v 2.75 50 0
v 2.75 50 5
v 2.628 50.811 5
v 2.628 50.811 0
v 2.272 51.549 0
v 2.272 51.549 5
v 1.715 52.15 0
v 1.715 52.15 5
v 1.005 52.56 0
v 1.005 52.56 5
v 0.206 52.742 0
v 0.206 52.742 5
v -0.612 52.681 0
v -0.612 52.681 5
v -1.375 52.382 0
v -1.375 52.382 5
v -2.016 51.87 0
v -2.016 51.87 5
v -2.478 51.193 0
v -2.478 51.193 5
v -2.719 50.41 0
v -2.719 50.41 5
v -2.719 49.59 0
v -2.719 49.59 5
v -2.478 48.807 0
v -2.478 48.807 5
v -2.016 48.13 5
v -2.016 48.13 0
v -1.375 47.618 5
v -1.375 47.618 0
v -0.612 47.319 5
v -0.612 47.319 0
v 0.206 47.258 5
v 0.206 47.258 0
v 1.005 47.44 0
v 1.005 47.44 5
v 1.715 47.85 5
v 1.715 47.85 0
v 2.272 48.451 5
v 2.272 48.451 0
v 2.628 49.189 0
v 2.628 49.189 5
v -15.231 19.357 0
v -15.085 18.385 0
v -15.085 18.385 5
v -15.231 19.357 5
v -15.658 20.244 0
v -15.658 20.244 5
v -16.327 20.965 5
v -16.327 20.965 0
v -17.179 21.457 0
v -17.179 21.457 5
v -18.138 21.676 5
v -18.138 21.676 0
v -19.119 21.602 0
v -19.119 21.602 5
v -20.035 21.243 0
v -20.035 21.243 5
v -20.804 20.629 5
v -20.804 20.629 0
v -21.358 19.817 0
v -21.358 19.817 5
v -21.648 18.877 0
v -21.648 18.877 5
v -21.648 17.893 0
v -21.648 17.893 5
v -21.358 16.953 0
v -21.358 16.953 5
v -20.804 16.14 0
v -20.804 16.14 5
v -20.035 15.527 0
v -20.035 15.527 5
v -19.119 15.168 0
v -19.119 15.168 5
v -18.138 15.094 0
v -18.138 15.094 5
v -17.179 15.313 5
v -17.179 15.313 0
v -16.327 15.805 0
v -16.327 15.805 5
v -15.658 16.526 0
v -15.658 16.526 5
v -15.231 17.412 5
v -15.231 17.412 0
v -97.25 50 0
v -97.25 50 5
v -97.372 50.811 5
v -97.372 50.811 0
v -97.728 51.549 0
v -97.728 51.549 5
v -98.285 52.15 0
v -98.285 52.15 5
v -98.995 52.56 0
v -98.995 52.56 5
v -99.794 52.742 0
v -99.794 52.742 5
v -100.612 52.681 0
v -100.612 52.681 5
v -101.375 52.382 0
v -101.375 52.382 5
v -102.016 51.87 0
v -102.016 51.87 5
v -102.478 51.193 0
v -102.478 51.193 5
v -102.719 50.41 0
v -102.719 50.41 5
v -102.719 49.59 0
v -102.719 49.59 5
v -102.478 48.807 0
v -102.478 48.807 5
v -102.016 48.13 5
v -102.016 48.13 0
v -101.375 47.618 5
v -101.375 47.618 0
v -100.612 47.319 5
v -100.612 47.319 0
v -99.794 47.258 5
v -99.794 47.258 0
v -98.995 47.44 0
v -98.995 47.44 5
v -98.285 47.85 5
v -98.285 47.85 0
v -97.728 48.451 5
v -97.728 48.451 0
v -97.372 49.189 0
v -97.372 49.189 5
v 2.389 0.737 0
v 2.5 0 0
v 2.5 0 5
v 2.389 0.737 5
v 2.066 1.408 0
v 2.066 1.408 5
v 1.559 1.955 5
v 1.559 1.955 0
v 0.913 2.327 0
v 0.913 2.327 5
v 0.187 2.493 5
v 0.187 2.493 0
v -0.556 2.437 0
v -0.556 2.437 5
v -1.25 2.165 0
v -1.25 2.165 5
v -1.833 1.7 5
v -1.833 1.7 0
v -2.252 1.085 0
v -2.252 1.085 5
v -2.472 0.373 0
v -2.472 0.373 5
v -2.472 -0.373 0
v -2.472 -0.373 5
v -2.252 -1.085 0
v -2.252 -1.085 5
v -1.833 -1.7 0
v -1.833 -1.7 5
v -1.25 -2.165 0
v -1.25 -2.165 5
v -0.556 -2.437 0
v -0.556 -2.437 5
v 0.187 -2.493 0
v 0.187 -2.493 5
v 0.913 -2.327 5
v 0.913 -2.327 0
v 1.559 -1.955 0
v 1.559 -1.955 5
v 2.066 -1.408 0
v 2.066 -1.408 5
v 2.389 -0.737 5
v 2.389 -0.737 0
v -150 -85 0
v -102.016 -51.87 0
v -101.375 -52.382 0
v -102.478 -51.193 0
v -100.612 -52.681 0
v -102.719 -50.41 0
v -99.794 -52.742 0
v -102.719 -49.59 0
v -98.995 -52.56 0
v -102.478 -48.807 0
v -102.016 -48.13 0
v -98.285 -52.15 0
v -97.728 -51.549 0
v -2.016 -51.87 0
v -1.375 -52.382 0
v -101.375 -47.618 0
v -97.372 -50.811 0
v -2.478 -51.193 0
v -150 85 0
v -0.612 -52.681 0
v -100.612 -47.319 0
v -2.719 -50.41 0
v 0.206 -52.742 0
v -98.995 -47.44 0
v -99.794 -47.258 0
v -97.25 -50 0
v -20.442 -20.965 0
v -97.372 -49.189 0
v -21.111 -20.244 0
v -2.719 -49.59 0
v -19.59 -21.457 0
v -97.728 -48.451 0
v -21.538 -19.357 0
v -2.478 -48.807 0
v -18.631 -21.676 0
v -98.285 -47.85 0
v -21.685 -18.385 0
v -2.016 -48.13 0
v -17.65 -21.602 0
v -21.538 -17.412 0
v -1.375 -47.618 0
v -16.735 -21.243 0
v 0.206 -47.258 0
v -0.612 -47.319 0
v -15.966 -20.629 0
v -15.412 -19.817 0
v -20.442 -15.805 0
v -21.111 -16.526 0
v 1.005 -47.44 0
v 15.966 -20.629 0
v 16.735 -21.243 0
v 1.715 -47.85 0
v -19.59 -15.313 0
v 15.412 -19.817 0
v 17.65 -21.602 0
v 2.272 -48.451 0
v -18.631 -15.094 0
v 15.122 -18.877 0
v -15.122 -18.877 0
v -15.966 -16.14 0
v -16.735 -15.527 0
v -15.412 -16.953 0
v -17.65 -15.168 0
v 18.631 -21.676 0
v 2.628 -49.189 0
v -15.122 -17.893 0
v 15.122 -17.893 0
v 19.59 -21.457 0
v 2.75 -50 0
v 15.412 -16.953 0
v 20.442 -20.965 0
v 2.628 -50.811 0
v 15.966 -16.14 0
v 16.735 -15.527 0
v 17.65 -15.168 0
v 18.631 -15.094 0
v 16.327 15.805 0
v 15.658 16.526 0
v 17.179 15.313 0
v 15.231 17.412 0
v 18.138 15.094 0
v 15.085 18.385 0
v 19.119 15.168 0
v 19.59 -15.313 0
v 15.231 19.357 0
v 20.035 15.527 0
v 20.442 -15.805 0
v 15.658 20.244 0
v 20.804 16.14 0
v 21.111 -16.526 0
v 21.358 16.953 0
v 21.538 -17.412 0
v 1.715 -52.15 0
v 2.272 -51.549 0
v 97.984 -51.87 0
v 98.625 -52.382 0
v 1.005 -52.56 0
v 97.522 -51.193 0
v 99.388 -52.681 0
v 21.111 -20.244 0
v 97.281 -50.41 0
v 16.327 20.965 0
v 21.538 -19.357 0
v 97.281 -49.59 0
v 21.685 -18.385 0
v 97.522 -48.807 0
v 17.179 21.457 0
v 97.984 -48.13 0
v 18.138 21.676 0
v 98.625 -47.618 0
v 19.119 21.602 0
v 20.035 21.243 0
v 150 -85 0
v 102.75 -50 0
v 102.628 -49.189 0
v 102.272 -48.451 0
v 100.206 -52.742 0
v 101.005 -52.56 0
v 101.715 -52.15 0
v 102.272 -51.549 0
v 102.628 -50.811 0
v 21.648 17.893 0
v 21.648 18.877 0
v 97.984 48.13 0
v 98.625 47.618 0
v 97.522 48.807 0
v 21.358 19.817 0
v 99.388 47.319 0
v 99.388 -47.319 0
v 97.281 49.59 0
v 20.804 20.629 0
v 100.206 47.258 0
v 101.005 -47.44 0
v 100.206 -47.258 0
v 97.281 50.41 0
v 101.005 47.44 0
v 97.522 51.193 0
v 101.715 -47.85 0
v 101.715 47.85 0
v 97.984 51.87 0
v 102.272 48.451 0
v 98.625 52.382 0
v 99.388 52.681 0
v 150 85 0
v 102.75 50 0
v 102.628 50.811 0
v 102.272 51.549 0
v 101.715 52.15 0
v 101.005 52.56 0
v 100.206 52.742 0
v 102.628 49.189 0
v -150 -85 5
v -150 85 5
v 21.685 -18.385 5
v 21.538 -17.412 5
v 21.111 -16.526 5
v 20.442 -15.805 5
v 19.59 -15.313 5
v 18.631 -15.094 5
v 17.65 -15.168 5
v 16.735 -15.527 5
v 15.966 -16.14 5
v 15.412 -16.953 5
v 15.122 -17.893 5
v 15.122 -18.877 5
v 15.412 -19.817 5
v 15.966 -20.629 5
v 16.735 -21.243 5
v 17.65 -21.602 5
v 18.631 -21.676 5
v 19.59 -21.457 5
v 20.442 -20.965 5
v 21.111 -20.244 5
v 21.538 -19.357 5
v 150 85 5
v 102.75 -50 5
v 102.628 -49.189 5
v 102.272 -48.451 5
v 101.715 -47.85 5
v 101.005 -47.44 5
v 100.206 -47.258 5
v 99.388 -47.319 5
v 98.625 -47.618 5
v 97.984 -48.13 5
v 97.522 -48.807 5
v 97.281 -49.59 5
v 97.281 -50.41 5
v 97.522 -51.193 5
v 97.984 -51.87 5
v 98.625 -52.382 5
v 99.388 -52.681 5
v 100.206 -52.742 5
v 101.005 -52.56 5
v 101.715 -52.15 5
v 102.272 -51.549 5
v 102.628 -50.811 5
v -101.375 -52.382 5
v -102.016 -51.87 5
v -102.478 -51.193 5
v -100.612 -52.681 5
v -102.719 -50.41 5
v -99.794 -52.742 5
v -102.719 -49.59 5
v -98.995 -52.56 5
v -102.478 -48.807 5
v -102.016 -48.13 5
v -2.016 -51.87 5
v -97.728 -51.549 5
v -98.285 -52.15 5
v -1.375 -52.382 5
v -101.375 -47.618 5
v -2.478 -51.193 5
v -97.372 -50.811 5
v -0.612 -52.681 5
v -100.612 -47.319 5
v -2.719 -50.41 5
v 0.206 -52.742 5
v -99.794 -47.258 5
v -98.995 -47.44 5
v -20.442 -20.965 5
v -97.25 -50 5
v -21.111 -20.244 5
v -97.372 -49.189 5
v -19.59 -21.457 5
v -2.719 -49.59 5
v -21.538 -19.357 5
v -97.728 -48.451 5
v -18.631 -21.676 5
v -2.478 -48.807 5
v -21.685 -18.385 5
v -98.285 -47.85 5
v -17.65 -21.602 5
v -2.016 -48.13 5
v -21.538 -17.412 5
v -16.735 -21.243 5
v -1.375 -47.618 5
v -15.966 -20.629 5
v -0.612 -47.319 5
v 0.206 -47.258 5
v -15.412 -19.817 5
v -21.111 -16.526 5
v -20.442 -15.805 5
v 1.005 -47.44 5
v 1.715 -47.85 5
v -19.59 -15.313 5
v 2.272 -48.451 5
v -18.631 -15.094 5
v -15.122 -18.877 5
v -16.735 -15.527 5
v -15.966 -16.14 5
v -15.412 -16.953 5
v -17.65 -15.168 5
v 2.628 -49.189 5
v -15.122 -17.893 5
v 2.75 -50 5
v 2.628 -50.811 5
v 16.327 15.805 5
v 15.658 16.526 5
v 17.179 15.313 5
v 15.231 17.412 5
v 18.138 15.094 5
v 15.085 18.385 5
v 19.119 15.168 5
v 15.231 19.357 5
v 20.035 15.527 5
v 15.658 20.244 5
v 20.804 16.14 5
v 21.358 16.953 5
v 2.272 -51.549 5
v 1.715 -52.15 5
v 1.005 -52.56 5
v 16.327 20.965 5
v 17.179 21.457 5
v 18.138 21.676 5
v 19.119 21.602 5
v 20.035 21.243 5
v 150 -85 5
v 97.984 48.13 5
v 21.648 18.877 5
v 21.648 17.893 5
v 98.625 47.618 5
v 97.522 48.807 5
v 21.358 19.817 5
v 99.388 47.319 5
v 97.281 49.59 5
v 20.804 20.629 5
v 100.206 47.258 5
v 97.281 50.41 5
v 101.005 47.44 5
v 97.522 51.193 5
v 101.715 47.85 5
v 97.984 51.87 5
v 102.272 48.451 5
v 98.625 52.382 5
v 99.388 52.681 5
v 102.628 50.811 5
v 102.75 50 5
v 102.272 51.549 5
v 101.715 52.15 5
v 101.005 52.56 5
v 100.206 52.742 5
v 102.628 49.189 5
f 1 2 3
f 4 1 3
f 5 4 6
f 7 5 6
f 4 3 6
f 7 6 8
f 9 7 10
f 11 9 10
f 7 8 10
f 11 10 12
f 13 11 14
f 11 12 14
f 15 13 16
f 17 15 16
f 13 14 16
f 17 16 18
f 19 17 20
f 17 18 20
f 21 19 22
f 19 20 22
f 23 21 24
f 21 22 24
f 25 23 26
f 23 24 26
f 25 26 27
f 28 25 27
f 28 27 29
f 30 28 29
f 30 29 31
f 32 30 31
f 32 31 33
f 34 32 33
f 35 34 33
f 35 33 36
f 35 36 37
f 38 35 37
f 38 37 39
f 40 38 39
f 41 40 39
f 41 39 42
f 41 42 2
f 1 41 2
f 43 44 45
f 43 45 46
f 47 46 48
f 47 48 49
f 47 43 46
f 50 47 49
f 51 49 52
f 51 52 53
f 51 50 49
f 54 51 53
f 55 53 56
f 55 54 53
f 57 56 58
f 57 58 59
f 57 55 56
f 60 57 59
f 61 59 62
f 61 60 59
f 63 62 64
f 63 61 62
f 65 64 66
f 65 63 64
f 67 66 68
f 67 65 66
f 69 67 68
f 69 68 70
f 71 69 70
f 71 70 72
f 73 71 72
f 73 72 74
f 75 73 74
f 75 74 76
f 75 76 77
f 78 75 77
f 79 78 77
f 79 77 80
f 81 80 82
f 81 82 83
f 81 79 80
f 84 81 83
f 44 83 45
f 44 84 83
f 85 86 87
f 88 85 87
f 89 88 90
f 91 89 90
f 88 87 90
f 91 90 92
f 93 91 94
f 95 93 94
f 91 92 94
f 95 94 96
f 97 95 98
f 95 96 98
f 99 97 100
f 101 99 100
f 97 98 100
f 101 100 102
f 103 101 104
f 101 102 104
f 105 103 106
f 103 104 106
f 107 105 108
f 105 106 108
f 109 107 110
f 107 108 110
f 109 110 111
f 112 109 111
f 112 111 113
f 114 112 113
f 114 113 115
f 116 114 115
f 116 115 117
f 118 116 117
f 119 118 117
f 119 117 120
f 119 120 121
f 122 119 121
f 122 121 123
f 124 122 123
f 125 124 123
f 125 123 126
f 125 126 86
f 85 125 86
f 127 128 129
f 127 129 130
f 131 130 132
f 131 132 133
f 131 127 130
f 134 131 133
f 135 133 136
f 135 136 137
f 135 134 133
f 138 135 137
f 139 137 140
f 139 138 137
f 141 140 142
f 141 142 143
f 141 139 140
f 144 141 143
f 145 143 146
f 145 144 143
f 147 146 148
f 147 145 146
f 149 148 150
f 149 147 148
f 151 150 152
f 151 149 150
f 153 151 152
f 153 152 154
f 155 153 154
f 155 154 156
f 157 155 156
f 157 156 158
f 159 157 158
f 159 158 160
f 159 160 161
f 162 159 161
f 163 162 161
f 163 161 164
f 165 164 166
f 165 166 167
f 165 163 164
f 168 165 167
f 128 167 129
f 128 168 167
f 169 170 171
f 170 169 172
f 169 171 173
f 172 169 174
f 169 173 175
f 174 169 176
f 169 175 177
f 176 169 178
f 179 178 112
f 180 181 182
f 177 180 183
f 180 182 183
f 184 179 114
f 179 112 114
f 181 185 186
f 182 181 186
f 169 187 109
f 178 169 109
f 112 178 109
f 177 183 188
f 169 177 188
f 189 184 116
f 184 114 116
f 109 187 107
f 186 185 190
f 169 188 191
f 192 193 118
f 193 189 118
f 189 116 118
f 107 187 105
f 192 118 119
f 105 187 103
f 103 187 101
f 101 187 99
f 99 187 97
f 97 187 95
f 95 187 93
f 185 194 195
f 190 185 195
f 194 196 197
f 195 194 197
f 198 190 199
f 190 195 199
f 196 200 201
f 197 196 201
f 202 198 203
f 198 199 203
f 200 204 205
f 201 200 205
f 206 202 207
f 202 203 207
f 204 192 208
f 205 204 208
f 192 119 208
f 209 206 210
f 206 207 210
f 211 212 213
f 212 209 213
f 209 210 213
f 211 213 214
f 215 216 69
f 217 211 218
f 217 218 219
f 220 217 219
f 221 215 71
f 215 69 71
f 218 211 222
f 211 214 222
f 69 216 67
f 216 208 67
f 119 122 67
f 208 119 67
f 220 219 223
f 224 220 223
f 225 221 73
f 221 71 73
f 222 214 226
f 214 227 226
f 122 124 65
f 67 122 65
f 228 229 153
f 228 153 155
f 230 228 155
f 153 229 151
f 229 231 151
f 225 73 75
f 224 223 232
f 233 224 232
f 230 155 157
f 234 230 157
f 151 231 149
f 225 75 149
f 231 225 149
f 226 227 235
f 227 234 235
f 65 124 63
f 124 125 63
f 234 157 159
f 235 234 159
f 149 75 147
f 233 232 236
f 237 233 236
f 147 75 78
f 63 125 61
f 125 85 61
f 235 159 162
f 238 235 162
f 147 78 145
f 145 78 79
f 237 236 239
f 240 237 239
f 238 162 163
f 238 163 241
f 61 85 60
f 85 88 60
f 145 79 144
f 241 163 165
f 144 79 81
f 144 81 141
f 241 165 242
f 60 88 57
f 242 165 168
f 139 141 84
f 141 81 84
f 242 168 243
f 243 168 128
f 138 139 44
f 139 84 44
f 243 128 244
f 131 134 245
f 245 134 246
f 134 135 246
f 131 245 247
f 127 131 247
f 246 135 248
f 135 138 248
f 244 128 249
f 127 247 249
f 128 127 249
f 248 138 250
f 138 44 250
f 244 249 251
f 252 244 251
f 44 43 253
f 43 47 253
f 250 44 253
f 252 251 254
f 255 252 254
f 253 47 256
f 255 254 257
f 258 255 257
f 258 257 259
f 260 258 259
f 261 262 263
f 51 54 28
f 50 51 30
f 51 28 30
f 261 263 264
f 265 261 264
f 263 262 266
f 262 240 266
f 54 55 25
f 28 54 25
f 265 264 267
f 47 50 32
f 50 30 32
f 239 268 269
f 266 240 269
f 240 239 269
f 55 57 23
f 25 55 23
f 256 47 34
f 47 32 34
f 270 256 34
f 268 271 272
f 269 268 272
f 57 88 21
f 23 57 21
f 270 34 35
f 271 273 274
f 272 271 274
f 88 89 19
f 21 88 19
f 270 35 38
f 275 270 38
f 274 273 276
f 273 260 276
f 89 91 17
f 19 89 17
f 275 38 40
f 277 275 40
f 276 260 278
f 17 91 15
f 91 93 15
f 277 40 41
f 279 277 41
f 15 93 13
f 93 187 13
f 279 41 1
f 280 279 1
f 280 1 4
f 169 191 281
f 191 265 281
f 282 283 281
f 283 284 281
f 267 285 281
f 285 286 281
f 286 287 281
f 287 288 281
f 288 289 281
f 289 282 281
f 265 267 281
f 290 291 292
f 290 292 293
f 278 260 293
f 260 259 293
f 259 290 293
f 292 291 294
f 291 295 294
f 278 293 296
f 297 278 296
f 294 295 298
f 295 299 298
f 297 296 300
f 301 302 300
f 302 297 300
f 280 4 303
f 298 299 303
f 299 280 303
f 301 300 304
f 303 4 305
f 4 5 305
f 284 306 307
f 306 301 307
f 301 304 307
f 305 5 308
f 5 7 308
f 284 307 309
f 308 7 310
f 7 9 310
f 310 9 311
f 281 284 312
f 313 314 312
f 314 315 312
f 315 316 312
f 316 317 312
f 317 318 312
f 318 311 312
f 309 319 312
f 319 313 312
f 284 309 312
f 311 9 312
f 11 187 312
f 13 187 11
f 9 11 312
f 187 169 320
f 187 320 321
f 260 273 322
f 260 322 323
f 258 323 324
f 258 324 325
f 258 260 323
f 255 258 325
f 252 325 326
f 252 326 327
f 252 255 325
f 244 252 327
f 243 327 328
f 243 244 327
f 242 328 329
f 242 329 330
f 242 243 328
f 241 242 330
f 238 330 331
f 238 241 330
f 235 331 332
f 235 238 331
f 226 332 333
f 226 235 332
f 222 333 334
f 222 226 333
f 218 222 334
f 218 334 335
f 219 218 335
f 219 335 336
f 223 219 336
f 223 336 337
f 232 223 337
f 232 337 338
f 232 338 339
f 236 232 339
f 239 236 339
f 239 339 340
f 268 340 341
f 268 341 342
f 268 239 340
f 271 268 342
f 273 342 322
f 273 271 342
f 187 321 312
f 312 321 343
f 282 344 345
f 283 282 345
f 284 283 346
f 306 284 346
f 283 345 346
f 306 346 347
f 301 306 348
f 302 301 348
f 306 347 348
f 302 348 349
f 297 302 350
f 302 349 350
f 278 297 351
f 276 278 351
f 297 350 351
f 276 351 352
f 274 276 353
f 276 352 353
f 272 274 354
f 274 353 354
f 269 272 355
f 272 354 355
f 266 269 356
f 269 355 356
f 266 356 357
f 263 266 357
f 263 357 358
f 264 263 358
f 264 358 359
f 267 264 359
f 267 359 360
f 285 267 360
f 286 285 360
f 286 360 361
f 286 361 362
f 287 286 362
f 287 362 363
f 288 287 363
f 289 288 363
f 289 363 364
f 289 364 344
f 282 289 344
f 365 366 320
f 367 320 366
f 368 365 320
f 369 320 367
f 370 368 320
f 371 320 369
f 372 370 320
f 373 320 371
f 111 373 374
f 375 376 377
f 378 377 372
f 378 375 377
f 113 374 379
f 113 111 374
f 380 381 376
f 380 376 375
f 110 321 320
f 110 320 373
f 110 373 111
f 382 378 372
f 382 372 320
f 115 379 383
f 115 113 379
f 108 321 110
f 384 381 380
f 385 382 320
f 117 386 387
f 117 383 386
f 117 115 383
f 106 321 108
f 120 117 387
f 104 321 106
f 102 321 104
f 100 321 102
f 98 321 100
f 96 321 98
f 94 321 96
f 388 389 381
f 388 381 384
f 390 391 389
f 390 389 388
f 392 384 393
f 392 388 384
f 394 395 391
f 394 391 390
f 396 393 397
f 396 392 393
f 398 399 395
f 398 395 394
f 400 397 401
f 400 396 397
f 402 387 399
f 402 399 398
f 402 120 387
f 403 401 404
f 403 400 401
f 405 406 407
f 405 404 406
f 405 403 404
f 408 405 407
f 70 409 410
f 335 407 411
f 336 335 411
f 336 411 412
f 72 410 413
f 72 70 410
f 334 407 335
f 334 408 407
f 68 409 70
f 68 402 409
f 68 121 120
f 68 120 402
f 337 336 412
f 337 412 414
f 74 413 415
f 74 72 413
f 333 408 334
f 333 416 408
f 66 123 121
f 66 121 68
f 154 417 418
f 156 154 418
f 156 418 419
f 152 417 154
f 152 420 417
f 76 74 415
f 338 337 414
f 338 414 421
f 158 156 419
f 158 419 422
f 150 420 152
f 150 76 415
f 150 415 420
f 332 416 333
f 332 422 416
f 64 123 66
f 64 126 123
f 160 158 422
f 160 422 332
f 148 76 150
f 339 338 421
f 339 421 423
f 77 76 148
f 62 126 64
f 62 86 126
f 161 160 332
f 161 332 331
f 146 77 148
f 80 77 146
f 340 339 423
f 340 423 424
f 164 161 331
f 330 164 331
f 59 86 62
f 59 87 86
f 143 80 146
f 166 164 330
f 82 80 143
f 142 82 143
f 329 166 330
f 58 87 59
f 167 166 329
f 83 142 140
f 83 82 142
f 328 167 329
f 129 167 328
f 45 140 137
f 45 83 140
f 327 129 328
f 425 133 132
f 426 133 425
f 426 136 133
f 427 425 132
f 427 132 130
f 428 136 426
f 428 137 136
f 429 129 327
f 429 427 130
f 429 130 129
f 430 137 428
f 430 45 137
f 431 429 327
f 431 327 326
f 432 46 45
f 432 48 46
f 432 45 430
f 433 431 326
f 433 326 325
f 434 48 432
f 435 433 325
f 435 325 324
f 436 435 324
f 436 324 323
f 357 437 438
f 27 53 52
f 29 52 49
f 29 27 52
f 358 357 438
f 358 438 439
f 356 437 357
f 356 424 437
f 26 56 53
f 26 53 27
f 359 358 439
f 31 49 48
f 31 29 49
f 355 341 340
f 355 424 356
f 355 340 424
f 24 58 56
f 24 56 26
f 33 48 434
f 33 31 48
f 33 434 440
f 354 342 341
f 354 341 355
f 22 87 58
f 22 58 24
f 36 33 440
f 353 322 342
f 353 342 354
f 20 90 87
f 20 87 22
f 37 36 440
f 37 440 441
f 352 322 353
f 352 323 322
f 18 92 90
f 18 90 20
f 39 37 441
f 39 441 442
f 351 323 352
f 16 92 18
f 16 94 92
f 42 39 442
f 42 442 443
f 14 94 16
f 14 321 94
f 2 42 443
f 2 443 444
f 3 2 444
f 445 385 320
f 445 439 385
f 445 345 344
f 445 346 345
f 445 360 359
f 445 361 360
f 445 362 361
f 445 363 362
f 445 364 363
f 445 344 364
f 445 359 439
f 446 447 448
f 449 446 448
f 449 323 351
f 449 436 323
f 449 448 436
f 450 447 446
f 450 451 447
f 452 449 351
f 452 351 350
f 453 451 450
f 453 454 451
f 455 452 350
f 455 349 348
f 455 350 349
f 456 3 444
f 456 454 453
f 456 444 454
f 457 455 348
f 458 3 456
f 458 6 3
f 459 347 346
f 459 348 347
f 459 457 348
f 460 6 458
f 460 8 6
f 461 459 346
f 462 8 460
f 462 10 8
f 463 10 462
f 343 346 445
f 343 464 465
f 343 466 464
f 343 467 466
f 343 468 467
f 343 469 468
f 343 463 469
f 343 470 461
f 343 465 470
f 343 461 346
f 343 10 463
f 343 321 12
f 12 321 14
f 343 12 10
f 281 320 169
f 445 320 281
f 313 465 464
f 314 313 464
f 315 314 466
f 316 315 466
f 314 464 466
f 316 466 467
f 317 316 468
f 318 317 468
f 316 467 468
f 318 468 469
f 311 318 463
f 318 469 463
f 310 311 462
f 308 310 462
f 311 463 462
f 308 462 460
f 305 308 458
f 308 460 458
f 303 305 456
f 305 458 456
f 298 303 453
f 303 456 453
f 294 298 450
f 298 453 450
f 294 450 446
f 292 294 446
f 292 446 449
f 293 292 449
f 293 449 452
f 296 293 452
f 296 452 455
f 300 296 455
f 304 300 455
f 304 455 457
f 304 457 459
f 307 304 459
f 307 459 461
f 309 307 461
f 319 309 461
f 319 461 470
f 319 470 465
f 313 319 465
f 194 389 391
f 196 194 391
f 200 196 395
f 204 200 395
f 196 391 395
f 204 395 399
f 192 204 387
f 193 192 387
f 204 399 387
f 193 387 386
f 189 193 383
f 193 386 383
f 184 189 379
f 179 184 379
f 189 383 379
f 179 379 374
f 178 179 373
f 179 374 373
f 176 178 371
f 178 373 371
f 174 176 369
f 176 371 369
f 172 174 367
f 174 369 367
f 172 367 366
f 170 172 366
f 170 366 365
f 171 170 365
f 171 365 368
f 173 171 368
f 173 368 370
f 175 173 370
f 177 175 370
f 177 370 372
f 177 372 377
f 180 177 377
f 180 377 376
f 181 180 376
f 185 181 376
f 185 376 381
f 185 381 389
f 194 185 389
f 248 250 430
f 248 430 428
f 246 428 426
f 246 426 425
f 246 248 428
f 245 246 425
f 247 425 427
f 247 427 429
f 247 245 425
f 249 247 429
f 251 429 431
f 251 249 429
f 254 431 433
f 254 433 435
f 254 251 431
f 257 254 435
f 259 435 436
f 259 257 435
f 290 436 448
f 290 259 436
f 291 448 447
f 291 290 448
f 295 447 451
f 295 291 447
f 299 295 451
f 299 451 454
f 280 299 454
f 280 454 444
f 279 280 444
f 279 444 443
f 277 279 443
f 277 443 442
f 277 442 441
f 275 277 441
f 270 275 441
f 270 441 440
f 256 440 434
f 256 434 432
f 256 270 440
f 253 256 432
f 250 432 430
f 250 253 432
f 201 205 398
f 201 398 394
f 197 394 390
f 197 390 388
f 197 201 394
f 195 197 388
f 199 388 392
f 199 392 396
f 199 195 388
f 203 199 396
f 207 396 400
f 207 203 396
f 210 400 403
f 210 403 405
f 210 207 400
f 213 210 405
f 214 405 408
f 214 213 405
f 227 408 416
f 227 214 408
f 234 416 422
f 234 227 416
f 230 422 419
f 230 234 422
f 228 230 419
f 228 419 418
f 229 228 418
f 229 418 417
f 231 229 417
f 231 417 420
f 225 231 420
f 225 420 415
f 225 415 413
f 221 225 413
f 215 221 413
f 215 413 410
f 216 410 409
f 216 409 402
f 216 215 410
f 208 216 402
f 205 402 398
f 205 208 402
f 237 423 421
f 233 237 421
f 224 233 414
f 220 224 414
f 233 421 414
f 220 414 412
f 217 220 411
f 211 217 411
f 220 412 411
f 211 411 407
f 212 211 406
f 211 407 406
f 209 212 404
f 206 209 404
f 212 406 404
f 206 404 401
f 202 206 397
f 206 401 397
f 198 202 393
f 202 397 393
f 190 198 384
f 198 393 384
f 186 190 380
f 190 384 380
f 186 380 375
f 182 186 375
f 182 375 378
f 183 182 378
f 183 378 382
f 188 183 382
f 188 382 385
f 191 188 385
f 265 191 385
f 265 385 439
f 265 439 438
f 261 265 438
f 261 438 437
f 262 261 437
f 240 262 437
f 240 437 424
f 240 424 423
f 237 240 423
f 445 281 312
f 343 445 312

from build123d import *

# Parameters (mm, degrees)
SKETCH_1_W          = 300
SKETCH_1_H          = 250
SKETCH_1_R          = 3.3
SKETCH_1_R_2        = 2.5
EXTRUDE_1_DEPTH     = 5
SKETCH_2_R          = 2.75
CUT_EXTRUDE_1_DEPTH = 196.320249846
SKETCH_3_W          = 300
SKETCH_3_H          = 40
CUT_EXTRUDE_2_DEPTH = 196.320249846


with BuildPart() as part:
    # 草图1 → 凸台-拉伸1 (new body)
    with BuildSketch(Plane.XY):
        Rectangle(SKETCH_1_W, SKETCH_1_H)
        with Locations((-18.384776311, 18.384776311)):
            Circle(SKETCH_1_R, mode=Mode.SUBTRACT)
        with Locations(Location((18.384776311, 18.384776311, 0), (0, 0, 180))):
            Circle(SKETCH_1_R, mode=Mode.SUBTRACT)
        with Locations((18.384776311, -18.384776311)):
            Circle(SKETCH_1_R, mode=Mode.SUBTRACT)
        with Locations(Location((-18.384776311, -18.384776311, 0), (0, 0, 180))):
            Circle(SKETCH_1_R, mode=Mode.SUBTRACT)
        Circle(SKETCH_1_R_2, mode=Mode.SUBTRACT)
    extrude(amount=EXTRUDE_1_DEPTH)

    # 草图2 → 切除-拉伸1 (cut, through all)
    with BuildSketch(Plane.XY.offset(5)):
        with Locations((-100, 50)):
            Circle(SKETCH_2_R)
        with Locations((0, 50)):
            Circle(SKETCH_2_R)
        with Locations((100, 50)):
            Circle(SKETCH_2_R)
        with Locations((100, -50)):
            Circle(SKETCH_2_R)
        with Locations((0, -50)):
            Circle(SKETCH_2_R)
        with Locations((-100, -50)):
            Circle(SKETCH_2_R)
    extrude(amount=-CUT_EXTRUDE_1_DEPTH, mode=Mode.SUBTRACT)

    # 草图3 → 切除-拉伸2 (cut, through all)
    with BuildSketch(Plane.XY.offset(5)):
        with Locations((0, 105)):
            Rectangle(SKETCH_3_W, SKETCH_3_H)
        with Locations((0, -105)):
            Rectangle(SKETCH_3_W, SKETCH_3_H)
    extrude(amount=-CUT_EXTRUDE_2_DEPTH, mode=Mode.SUBTRACT)


solid = part.part
